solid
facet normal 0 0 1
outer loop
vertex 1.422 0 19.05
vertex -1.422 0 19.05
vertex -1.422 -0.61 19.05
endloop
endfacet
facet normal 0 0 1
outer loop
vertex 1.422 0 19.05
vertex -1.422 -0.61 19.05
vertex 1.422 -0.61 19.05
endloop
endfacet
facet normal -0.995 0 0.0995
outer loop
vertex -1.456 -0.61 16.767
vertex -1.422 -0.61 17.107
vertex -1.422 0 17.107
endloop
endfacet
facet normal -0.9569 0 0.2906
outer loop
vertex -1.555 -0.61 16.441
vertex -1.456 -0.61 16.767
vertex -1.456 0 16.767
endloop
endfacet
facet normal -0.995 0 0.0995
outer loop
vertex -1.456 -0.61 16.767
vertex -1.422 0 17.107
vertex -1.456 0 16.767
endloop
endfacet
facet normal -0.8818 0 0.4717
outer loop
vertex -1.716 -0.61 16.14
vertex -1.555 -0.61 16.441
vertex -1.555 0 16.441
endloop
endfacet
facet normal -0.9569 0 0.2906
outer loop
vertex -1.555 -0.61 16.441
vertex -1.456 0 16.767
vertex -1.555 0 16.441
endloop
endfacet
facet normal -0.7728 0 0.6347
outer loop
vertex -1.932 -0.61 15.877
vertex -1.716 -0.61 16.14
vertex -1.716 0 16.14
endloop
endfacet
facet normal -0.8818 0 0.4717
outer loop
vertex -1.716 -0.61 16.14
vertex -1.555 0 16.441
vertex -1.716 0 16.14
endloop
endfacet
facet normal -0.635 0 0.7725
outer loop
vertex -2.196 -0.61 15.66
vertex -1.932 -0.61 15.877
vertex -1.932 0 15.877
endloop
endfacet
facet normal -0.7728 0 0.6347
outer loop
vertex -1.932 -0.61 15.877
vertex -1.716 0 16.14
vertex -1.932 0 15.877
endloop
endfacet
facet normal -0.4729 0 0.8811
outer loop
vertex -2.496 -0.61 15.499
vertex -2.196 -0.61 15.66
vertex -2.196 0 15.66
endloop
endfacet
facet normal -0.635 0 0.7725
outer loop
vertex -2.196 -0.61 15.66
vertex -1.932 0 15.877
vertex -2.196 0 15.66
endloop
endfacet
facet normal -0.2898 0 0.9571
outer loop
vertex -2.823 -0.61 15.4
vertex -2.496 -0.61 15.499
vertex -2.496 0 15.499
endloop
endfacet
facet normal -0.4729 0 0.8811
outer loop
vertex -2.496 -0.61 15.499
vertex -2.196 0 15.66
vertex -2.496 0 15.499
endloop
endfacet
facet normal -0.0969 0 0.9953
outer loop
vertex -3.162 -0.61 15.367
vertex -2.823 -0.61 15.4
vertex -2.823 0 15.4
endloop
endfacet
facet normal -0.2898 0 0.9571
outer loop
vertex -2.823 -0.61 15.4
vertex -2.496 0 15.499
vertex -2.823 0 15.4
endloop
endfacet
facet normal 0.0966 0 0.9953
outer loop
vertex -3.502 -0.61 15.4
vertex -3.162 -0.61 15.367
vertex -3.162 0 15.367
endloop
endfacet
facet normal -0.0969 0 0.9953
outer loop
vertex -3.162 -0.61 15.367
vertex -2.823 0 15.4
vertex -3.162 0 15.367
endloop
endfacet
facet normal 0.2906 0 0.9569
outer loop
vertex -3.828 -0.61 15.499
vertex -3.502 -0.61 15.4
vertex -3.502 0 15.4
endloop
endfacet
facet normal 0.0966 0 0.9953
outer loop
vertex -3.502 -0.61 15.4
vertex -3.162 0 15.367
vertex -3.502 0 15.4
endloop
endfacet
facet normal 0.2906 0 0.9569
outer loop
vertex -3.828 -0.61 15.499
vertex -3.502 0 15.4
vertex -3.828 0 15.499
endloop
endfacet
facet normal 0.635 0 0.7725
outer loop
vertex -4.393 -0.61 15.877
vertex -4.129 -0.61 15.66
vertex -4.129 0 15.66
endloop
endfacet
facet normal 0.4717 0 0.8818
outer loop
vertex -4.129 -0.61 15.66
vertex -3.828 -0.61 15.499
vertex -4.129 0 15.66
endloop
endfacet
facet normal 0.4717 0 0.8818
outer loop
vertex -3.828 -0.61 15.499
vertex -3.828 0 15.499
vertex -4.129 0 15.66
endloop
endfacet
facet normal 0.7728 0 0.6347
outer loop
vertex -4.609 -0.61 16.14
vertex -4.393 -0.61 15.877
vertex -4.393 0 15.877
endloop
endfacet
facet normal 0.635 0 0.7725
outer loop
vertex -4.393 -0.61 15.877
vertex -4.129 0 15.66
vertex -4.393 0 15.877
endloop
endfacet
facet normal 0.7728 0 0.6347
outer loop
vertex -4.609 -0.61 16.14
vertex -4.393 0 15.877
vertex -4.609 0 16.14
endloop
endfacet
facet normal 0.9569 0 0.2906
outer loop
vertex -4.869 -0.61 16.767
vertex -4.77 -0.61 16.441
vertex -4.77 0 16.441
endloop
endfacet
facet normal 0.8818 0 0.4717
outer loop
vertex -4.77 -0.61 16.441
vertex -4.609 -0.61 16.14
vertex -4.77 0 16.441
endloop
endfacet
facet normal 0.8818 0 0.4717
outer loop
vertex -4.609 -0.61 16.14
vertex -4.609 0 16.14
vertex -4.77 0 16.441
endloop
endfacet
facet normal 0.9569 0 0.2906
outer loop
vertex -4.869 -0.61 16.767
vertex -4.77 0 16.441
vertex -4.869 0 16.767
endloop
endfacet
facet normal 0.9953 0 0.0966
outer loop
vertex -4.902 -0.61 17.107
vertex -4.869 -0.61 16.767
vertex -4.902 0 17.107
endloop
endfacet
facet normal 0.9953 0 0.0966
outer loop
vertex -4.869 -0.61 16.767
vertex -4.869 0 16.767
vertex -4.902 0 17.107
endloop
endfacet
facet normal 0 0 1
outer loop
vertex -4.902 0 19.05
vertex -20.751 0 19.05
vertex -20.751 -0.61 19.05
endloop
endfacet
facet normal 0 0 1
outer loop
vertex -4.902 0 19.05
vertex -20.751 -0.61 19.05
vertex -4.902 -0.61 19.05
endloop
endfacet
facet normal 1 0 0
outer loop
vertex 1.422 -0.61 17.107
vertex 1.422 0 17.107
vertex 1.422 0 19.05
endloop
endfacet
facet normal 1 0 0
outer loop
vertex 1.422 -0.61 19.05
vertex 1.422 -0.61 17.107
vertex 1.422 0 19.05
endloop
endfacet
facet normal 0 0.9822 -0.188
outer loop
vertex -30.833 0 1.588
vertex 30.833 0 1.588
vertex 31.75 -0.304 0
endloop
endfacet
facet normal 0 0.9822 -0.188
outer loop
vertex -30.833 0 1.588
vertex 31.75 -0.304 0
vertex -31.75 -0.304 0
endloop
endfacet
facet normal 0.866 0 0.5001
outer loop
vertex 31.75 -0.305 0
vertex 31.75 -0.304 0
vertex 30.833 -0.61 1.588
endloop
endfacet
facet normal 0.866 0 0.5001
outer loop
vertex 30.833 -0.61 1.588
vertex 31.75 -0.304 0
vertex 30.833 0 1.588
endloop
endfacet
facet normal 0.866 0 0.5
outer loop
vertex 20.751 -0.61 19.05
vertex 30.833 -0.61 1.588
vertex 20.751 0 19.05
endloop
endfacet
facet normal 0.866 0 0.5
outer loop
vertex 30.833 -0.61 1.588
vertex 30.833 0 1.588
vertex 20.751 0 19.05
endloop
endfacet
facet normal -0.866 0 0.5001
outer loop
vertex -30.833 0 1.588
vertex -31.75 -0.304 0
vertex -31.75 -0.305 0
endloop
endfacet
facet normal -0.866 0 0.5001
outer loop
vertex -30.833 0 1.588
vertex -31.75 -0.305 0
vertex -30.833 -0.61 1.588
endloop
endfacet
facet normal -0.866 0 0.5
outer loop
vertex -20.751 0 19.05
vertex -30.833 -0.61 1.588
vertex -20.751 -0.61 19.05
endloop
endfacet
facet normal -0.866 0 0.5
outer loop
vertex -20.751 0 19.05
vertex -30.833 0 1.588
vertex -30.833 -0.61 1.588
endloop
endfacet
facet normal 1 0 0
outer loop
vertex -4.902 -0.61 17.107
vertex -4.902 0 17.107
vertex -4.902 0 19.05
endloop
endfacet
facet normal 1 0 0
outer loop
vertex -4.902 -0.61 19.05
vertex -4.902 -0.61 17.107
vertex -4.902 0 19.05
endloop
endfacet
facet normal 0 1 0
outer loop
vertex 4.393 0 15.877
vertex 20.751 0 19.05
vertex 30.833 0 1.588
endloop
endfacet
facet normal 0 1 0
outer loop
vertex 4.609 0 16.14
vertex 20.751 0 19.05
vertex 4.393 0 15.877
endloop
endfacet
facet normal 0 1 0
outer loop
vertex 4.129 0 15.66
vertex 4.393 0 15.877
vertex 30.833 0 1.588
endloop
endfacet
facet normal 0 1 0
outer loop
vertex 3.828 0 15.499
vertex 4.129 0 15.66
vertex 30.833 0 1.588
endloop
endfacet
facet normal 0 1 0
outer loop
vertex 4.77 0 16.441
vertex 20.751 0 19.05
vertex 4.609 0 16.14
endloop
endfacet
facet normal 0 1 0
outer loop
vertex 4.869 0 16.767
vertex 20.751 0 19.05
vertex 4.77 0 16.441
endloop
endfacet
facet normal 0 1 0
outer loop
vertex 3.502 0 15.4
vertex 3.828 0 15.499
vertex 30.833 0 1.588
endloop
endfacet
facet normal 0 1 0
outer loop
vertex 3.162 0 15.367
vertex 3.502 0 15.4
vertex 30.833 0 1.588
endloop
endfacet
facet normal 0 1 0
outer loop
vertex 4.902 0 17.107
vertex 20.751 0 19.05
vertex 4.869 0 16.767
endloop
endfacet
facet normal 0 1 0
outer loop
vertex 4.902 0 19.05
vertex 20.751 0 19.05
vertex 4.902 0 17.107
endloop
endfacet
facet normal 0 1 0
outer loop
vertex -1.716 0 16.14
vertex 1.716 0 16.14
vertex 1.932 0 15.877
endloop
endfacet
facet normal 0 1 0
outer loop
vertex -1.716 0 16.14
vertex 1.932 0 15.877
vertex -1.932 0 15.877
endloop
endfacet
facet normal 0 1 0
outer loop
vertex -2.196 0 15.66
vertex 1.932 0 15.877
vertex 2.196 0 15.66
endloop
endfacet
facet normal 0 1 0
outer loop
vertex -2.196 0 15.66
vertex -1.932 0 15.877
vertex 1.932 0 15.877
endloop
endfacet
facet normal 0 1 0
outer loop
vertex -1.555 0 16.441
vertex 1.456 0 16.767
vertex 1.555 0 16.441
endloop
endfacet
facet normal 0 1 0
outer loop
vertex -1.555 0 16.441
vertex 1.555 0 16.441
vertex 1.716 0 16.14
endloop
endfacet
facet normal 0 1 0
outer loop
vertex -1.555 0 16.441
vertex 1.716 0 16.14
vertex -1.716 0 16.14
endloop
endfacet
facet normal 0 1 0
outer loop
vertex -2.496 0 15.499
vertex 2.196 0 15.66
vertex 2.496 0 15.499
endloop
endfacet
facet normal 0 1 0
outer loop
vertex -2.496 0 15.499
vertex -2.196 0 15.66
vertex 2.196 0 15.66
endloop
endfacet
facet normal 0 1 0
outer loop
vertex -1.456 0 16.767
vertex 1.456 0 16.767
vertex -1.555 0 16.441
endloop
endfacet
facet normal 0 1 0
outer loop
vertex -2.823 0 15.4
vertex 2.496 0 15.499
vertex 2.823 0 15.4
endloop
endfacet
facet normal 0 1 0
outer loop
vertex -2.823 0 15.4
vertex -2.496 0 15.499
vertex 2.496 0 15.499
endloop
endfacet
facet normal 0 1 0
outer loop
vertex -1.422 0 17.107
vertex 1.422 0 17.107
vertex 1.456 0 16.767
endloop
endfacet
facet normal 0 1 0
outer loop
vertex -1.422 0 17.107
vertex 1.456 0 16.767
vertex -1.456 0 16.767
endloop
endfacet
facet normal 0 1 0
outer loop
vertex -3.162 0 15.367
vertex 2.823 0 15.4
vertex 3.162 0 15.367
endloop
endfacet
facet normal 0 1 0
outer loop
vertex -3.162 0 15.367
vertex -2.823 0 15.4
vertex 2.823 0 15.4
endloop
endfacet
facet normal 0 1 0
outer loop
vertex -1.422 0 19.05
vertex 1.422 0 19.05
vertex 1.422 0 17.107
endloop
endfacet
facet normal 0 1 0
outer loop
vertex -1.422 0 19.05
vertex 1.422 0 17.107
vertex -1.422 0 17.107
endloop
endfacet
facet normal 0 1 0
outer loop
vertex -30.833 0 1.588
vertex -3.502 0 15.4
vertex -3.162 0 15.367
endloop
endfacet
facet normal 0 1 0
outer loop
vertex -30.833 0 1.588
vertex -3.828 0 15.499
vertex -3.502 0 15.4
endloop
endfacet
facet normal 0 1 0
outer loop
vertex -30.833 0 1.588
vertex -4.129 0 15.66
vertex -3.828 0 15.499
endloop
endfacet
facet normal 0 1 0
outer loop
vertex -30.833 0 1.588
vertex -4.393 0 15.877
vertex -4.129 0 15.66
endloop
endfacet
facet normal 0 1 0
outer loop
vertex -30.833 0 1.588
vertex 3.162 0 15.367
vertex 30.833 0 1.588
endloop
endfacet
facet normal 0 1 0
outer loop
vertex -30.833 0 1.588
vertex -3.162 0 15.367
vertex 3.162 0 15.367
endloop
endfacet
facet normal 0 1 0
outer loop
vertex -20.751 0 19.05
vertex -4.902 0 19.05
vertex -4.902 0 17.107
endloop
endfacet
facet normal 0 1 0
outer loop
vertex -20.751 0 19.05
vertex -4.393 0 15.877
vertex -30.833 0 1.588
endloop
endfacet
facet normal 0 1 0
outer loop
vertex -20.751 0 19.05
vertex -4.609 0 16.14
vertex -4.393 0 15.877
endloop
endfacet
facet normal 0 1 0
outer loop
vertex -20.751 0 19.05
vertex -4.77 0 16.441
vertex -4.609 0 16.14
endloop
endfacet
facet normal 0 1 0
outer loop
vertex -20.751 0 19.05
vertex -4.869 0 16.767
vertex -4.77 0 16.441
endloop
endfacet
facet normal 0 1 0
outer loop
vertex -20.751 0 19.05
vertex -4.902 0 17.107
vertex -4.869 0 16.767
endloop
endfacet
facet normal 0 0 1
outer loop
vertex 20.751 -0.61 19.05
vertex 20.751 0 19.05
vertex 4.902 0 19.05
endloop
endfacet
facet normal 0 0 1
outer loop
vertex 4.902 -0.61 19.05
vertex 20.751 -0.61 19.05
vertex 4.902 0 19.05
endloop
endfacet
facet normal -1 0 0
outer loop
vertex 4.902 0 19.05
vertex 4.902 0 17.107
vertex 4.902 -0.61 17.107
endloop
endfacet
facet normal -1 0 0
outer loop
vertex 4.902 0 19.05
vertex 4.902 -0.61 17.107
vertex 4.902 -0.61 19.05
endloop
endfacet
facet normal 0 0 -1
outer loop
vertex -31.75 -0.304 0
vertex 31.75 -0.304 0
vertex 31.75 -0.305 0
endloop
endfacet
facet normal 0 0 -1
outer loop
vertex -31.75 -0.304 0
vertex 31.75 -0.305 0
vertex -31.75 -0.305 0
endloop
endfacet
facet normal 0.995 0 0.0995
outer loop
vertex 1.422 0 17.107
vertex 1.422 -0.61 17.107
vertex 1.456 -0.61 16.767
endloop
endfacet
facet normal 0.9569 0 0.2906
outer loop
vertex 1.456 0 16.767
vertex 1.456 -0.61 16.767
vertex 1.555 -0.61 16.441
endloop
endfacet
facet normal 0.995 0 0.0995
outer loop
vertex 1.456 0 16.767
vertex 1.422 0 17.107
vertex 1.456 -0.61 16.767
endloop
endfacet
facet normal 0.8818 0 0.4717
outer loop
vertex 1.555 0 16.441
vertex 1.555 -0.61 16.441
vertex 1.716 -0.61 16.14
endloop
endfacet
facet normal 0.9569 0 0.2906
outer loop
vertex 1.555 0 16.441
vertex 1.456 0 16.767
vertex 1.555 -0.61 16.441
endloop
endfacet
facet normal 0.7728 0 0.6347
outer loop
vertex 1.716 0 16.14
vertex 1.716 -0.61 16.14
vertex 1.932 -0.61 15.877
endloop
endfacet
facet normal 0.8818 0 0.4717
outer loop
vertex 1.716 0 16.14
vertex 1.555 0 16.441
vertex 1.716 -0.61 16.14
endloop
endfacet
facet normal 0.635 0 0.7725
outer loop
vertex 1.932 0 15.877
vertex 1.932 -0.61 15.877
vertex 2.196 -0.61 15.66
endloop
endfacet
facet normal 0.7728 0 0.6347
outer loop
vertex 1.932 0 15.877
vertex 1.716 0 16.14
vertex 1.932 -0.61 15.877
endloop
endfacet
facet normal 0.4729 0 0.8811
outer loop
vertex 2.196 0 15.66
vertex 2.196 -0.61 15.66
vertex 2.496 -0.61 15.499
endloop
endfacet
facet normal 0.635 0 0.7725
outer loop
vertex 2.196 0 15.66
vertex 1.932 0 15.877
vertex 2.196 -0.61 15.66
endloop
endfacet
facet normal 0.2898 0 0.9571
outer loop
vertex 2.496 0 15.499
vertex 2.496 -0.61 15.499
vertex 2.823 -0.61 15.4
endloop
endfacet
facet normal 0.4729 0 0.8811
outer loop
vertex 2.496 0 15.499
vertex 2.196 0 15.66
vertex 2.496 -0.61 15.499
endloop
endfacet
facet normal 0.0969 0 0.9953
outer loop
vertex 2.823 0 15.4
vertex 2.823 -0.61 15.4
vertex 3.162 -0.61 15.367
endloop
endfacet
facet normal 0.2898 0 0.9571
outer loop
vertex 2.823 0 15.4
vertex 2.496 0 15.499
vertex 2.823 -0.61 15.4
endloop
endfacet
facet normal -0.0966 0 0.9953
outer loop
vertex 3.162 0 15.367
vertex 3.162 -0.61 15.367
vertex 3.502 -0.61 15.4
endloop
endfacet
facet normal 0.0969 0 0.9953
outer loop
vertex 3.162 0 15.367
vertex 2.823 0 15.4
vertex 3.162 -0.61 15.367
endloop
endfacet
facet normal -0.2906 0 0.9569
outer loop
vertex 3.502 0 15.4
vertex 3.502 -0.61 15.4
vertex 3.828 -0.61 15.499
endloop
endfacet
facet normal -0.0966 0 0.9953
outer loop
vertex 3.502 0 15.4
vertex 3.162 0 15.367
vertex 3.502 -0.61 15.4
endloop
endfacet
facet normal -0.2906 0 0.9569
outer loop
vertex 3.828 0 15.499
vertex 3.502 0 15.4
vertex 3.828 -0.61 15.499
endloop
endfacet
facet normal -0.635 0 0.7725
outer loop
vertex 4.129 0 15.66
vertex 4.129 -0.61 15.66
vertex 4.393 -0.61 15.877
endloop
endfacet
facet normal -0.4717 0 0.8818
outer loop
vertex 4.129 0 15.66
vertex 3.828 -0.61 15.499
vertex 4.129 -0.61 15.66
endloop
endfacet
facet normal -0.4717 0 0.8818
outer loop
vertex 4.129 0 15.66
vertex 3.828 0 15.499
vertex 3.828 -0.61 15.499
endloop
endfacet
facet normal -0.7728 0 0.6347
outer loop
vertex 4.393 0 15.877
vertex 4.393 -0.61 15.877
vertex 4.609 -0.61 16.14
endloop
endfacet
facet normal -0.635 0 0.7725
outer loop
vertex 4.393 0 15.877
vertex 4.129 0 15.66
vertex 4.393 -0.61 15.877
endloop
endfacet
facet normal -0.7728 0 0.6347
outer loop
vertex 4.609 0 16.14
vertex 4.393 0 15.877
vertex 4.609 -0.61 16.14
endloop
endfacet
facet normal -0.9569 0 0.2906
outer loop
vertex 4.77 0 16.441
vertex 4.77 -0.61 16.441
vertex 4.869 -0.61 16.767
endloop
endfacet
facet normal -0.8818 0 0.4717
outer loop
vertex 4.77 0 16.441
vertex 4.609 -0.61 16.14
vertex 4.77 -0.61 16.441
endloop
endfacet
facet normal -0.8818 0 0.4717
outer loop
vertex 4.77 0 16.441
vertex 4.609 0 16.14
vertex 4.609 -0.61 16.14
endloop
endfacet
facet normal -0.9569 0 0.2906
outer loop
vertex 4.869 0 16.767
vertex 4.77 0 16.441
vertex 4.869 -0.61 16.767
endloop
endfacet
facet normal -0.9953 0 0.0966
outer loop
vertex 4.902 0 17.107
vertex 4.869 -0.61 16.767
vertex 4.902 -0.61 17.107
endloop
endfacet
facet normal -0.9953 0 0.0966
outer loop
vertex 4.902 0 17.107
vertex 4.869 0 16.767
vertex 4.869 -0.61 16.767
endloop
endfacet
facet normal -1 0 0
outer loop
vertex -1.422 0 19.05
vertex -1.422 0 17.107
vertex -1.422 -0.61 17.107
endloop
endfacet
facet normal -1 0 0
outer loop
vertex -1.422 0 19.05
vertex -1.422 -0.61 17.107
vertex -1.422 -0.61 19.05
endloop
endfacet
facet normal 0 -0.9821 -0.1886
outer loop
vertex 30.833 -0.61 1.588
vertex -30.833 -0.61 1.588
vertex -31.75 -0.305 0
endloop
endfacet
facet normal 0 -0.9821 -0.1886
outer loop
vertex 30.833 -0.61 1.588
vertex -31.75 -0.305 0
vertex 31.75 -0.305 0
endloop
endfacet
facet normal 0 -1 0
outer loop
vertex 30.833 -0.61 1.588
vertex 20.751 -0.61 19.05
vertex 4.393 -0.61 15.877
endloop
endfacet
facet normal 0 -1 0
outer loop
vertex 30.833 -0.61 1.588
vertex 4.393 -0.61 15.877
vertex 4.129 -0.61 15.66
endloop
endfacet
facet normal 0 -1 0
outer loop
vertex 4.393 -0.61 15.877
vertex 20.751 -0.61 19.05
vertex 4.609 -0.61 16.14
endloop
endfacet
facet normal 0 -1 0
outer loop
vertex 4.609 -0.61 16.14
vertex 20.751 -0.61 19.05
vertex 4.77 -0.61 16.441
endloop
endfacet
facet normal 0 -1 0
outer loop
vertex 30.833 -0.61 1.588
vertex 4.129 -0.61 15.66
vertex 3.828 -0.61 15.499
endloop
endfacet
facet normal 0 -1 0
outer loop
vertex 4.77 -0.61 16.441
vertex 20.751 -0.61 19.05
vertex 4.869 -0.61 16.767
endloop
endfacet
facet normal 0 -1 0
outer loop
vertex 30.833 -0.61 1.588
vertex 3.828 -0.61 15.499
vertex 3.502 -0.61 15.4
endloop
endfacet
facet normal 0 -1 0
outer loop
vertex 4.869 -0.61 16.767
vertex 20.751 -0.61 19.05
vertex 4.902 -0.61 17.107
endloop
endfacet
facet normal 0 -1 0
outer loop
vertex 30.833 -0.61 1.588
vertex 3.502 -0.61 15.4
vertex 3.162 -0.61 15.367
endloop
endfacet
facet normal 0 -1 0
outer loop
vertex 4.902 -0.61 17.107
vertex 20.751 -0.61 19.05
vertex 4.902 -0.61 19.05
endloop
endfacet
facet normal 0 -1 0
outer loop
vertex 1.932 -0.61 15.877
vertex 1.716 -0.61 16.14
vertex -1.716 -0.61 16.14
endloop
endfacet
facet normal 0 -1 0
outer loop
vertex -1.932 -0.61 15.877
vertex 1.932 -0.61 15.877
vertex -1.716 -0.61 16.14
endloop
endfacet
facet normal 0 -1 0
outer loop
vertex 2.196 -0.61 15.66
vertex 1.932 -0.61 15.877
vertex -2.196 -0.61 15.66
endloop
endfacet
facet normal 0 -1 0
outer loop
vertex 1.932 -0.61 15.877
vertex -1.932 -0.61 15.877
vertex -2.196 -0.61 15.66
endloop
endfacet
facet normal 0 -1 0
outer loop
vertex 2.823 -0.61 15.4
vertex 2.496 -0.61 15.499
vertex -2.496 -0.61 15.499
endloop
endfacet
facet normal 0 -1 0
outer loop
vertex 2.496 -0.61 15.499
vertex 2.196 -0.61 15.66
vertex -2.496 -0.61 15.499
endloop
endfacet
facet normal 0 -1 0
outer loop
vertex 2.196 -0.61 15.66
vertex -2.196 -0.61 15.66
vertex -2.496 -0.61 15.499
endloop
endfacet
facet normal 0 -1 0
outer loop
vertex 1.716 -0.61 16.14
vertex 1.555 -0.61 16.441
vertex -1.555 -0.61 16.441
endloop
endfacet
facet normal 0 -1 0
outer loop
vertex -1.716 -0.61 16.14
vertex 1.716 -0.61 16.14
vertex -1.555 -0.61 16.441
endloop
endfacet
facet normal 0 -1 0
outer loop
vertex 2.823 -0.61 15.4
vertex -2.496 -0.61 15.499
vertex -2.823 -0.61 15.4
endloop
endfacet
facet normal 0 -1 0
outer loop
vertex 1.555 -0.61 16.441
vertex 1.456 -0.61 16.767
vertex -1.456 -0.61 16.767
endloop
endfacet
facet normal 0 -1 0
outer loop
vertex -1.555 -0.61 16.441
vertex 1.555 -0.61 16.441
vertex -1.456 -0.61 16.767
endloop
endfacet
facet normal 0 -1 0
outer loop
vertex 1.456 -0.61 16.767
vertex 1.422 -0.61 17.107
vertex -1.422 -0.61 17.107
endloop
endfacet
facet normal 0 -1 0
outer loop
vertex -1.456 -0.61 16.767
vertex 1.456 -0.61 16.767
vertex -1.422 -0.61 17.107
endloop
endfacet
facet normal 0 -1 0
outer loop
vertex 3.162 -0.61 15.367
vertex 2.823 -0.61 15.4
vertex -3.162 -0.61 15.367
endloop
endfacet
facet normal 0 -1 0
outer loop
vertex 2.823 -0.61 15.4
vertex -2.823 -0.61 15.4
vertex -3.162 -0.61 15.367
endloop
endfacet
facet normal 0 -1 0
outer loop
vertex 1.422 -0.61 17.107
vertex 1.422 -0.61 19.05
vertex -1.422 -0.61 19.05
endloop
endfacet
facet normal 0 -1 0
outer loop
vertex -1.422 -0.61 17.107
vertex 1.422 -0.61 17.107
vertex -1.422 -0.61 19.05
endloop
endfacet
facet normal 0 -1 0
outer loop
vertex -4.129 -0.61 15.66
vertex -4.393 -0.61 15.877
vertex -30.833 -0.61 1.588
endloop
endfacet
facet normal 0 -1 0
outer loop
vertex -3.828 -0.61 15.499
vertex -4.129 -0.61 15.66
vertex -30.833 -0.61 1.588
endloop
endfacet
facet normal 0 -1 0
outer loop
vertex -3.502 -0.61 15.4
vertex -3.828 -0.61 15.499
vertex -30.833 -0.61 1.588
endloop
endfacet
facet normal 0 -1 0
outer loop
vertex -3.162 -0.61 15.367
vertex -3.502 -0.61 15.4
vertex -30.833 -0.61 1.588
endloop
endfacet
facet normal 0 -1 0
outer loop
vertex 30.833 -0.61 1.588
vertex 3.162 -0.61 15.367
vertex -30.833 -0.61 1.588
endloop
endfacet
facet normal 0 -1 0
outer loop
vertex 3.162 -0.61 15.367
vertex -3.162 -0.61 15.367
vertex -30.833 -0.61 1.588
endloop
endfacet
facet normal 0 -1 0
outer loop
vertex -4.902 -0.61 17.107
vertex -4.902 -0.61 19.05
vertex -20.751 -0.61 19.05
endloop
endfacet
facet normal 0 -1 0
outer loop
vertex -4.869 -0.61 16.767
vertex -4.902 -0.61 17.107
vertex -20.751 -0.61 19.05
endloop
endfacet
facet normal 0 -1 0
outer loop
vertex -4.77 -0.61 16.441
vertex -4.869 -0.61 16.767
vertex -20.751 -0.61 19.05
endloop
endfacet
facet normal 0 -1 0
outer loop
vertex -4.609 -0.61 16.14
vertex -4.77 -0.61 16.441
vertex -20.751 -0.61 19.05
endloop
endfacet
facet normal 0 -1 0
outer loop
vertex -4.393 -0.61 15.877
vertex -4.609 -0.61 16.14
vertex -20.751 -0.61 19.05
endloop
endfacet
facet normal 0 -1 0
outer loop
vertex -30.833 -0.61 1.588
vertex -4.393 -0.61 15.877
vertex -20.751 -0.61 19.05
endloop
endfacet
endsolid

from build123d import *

# Parameters (mm, degrees)
F1_DEPTH = 0.6096
F2_W     = 3.4798
F2_H     = 1.9431
F3_DEPTH = 25.4
F5_SIZE2 = 1.5875
F5_SIZE  = 0.3042678278


with BuildPart() as f1:
    # F0 (on Front) → F1 (new body)
    with BuildSketch(Plane.XZ):
        Polygon((0, 19.05), (0, 0), (31.75, 0), (20.7514773719, 19.05), align=None)
    extrude(amount=F1_DEPTH)

    # F2 (on Front) → F3 (cut)
    with BuildSketch(Plane.XZ):
        with BuildLine():
            ThreePointArc((1.4224, 17.1069), (3.1623, 15.367), (4.9022, 17.1069))
            Line((4.9022, 17.1069), (1.4224, 17.1069))
        make_face()
        with Locations((3.1623, 18.07845)):
            Rectangle(F2_W, F2_H)
    extrude(amount=F3_DEPTH, mode=Mode.SUBTRACT)

    # F4: F1 across plane


with BuildPart() as f1_1:
    add(f1.part)
    add(f1.part.mirror(Plane.YZ))

    # F5
    f5_edges = [f1_1.edges().sort_by_distance(p)[0] for p in [
        (0, 0, 0),
        (0, -0.6096, 0),
    ]]
    f5_side = f1_1.faces().sort_by_distance((0, -0.3048, 0))[0]
    chamfer(f5_edges, length=F5_SIZE, length2=F5_SIZE2, reference=f5_side)


solid = f1_1.part
